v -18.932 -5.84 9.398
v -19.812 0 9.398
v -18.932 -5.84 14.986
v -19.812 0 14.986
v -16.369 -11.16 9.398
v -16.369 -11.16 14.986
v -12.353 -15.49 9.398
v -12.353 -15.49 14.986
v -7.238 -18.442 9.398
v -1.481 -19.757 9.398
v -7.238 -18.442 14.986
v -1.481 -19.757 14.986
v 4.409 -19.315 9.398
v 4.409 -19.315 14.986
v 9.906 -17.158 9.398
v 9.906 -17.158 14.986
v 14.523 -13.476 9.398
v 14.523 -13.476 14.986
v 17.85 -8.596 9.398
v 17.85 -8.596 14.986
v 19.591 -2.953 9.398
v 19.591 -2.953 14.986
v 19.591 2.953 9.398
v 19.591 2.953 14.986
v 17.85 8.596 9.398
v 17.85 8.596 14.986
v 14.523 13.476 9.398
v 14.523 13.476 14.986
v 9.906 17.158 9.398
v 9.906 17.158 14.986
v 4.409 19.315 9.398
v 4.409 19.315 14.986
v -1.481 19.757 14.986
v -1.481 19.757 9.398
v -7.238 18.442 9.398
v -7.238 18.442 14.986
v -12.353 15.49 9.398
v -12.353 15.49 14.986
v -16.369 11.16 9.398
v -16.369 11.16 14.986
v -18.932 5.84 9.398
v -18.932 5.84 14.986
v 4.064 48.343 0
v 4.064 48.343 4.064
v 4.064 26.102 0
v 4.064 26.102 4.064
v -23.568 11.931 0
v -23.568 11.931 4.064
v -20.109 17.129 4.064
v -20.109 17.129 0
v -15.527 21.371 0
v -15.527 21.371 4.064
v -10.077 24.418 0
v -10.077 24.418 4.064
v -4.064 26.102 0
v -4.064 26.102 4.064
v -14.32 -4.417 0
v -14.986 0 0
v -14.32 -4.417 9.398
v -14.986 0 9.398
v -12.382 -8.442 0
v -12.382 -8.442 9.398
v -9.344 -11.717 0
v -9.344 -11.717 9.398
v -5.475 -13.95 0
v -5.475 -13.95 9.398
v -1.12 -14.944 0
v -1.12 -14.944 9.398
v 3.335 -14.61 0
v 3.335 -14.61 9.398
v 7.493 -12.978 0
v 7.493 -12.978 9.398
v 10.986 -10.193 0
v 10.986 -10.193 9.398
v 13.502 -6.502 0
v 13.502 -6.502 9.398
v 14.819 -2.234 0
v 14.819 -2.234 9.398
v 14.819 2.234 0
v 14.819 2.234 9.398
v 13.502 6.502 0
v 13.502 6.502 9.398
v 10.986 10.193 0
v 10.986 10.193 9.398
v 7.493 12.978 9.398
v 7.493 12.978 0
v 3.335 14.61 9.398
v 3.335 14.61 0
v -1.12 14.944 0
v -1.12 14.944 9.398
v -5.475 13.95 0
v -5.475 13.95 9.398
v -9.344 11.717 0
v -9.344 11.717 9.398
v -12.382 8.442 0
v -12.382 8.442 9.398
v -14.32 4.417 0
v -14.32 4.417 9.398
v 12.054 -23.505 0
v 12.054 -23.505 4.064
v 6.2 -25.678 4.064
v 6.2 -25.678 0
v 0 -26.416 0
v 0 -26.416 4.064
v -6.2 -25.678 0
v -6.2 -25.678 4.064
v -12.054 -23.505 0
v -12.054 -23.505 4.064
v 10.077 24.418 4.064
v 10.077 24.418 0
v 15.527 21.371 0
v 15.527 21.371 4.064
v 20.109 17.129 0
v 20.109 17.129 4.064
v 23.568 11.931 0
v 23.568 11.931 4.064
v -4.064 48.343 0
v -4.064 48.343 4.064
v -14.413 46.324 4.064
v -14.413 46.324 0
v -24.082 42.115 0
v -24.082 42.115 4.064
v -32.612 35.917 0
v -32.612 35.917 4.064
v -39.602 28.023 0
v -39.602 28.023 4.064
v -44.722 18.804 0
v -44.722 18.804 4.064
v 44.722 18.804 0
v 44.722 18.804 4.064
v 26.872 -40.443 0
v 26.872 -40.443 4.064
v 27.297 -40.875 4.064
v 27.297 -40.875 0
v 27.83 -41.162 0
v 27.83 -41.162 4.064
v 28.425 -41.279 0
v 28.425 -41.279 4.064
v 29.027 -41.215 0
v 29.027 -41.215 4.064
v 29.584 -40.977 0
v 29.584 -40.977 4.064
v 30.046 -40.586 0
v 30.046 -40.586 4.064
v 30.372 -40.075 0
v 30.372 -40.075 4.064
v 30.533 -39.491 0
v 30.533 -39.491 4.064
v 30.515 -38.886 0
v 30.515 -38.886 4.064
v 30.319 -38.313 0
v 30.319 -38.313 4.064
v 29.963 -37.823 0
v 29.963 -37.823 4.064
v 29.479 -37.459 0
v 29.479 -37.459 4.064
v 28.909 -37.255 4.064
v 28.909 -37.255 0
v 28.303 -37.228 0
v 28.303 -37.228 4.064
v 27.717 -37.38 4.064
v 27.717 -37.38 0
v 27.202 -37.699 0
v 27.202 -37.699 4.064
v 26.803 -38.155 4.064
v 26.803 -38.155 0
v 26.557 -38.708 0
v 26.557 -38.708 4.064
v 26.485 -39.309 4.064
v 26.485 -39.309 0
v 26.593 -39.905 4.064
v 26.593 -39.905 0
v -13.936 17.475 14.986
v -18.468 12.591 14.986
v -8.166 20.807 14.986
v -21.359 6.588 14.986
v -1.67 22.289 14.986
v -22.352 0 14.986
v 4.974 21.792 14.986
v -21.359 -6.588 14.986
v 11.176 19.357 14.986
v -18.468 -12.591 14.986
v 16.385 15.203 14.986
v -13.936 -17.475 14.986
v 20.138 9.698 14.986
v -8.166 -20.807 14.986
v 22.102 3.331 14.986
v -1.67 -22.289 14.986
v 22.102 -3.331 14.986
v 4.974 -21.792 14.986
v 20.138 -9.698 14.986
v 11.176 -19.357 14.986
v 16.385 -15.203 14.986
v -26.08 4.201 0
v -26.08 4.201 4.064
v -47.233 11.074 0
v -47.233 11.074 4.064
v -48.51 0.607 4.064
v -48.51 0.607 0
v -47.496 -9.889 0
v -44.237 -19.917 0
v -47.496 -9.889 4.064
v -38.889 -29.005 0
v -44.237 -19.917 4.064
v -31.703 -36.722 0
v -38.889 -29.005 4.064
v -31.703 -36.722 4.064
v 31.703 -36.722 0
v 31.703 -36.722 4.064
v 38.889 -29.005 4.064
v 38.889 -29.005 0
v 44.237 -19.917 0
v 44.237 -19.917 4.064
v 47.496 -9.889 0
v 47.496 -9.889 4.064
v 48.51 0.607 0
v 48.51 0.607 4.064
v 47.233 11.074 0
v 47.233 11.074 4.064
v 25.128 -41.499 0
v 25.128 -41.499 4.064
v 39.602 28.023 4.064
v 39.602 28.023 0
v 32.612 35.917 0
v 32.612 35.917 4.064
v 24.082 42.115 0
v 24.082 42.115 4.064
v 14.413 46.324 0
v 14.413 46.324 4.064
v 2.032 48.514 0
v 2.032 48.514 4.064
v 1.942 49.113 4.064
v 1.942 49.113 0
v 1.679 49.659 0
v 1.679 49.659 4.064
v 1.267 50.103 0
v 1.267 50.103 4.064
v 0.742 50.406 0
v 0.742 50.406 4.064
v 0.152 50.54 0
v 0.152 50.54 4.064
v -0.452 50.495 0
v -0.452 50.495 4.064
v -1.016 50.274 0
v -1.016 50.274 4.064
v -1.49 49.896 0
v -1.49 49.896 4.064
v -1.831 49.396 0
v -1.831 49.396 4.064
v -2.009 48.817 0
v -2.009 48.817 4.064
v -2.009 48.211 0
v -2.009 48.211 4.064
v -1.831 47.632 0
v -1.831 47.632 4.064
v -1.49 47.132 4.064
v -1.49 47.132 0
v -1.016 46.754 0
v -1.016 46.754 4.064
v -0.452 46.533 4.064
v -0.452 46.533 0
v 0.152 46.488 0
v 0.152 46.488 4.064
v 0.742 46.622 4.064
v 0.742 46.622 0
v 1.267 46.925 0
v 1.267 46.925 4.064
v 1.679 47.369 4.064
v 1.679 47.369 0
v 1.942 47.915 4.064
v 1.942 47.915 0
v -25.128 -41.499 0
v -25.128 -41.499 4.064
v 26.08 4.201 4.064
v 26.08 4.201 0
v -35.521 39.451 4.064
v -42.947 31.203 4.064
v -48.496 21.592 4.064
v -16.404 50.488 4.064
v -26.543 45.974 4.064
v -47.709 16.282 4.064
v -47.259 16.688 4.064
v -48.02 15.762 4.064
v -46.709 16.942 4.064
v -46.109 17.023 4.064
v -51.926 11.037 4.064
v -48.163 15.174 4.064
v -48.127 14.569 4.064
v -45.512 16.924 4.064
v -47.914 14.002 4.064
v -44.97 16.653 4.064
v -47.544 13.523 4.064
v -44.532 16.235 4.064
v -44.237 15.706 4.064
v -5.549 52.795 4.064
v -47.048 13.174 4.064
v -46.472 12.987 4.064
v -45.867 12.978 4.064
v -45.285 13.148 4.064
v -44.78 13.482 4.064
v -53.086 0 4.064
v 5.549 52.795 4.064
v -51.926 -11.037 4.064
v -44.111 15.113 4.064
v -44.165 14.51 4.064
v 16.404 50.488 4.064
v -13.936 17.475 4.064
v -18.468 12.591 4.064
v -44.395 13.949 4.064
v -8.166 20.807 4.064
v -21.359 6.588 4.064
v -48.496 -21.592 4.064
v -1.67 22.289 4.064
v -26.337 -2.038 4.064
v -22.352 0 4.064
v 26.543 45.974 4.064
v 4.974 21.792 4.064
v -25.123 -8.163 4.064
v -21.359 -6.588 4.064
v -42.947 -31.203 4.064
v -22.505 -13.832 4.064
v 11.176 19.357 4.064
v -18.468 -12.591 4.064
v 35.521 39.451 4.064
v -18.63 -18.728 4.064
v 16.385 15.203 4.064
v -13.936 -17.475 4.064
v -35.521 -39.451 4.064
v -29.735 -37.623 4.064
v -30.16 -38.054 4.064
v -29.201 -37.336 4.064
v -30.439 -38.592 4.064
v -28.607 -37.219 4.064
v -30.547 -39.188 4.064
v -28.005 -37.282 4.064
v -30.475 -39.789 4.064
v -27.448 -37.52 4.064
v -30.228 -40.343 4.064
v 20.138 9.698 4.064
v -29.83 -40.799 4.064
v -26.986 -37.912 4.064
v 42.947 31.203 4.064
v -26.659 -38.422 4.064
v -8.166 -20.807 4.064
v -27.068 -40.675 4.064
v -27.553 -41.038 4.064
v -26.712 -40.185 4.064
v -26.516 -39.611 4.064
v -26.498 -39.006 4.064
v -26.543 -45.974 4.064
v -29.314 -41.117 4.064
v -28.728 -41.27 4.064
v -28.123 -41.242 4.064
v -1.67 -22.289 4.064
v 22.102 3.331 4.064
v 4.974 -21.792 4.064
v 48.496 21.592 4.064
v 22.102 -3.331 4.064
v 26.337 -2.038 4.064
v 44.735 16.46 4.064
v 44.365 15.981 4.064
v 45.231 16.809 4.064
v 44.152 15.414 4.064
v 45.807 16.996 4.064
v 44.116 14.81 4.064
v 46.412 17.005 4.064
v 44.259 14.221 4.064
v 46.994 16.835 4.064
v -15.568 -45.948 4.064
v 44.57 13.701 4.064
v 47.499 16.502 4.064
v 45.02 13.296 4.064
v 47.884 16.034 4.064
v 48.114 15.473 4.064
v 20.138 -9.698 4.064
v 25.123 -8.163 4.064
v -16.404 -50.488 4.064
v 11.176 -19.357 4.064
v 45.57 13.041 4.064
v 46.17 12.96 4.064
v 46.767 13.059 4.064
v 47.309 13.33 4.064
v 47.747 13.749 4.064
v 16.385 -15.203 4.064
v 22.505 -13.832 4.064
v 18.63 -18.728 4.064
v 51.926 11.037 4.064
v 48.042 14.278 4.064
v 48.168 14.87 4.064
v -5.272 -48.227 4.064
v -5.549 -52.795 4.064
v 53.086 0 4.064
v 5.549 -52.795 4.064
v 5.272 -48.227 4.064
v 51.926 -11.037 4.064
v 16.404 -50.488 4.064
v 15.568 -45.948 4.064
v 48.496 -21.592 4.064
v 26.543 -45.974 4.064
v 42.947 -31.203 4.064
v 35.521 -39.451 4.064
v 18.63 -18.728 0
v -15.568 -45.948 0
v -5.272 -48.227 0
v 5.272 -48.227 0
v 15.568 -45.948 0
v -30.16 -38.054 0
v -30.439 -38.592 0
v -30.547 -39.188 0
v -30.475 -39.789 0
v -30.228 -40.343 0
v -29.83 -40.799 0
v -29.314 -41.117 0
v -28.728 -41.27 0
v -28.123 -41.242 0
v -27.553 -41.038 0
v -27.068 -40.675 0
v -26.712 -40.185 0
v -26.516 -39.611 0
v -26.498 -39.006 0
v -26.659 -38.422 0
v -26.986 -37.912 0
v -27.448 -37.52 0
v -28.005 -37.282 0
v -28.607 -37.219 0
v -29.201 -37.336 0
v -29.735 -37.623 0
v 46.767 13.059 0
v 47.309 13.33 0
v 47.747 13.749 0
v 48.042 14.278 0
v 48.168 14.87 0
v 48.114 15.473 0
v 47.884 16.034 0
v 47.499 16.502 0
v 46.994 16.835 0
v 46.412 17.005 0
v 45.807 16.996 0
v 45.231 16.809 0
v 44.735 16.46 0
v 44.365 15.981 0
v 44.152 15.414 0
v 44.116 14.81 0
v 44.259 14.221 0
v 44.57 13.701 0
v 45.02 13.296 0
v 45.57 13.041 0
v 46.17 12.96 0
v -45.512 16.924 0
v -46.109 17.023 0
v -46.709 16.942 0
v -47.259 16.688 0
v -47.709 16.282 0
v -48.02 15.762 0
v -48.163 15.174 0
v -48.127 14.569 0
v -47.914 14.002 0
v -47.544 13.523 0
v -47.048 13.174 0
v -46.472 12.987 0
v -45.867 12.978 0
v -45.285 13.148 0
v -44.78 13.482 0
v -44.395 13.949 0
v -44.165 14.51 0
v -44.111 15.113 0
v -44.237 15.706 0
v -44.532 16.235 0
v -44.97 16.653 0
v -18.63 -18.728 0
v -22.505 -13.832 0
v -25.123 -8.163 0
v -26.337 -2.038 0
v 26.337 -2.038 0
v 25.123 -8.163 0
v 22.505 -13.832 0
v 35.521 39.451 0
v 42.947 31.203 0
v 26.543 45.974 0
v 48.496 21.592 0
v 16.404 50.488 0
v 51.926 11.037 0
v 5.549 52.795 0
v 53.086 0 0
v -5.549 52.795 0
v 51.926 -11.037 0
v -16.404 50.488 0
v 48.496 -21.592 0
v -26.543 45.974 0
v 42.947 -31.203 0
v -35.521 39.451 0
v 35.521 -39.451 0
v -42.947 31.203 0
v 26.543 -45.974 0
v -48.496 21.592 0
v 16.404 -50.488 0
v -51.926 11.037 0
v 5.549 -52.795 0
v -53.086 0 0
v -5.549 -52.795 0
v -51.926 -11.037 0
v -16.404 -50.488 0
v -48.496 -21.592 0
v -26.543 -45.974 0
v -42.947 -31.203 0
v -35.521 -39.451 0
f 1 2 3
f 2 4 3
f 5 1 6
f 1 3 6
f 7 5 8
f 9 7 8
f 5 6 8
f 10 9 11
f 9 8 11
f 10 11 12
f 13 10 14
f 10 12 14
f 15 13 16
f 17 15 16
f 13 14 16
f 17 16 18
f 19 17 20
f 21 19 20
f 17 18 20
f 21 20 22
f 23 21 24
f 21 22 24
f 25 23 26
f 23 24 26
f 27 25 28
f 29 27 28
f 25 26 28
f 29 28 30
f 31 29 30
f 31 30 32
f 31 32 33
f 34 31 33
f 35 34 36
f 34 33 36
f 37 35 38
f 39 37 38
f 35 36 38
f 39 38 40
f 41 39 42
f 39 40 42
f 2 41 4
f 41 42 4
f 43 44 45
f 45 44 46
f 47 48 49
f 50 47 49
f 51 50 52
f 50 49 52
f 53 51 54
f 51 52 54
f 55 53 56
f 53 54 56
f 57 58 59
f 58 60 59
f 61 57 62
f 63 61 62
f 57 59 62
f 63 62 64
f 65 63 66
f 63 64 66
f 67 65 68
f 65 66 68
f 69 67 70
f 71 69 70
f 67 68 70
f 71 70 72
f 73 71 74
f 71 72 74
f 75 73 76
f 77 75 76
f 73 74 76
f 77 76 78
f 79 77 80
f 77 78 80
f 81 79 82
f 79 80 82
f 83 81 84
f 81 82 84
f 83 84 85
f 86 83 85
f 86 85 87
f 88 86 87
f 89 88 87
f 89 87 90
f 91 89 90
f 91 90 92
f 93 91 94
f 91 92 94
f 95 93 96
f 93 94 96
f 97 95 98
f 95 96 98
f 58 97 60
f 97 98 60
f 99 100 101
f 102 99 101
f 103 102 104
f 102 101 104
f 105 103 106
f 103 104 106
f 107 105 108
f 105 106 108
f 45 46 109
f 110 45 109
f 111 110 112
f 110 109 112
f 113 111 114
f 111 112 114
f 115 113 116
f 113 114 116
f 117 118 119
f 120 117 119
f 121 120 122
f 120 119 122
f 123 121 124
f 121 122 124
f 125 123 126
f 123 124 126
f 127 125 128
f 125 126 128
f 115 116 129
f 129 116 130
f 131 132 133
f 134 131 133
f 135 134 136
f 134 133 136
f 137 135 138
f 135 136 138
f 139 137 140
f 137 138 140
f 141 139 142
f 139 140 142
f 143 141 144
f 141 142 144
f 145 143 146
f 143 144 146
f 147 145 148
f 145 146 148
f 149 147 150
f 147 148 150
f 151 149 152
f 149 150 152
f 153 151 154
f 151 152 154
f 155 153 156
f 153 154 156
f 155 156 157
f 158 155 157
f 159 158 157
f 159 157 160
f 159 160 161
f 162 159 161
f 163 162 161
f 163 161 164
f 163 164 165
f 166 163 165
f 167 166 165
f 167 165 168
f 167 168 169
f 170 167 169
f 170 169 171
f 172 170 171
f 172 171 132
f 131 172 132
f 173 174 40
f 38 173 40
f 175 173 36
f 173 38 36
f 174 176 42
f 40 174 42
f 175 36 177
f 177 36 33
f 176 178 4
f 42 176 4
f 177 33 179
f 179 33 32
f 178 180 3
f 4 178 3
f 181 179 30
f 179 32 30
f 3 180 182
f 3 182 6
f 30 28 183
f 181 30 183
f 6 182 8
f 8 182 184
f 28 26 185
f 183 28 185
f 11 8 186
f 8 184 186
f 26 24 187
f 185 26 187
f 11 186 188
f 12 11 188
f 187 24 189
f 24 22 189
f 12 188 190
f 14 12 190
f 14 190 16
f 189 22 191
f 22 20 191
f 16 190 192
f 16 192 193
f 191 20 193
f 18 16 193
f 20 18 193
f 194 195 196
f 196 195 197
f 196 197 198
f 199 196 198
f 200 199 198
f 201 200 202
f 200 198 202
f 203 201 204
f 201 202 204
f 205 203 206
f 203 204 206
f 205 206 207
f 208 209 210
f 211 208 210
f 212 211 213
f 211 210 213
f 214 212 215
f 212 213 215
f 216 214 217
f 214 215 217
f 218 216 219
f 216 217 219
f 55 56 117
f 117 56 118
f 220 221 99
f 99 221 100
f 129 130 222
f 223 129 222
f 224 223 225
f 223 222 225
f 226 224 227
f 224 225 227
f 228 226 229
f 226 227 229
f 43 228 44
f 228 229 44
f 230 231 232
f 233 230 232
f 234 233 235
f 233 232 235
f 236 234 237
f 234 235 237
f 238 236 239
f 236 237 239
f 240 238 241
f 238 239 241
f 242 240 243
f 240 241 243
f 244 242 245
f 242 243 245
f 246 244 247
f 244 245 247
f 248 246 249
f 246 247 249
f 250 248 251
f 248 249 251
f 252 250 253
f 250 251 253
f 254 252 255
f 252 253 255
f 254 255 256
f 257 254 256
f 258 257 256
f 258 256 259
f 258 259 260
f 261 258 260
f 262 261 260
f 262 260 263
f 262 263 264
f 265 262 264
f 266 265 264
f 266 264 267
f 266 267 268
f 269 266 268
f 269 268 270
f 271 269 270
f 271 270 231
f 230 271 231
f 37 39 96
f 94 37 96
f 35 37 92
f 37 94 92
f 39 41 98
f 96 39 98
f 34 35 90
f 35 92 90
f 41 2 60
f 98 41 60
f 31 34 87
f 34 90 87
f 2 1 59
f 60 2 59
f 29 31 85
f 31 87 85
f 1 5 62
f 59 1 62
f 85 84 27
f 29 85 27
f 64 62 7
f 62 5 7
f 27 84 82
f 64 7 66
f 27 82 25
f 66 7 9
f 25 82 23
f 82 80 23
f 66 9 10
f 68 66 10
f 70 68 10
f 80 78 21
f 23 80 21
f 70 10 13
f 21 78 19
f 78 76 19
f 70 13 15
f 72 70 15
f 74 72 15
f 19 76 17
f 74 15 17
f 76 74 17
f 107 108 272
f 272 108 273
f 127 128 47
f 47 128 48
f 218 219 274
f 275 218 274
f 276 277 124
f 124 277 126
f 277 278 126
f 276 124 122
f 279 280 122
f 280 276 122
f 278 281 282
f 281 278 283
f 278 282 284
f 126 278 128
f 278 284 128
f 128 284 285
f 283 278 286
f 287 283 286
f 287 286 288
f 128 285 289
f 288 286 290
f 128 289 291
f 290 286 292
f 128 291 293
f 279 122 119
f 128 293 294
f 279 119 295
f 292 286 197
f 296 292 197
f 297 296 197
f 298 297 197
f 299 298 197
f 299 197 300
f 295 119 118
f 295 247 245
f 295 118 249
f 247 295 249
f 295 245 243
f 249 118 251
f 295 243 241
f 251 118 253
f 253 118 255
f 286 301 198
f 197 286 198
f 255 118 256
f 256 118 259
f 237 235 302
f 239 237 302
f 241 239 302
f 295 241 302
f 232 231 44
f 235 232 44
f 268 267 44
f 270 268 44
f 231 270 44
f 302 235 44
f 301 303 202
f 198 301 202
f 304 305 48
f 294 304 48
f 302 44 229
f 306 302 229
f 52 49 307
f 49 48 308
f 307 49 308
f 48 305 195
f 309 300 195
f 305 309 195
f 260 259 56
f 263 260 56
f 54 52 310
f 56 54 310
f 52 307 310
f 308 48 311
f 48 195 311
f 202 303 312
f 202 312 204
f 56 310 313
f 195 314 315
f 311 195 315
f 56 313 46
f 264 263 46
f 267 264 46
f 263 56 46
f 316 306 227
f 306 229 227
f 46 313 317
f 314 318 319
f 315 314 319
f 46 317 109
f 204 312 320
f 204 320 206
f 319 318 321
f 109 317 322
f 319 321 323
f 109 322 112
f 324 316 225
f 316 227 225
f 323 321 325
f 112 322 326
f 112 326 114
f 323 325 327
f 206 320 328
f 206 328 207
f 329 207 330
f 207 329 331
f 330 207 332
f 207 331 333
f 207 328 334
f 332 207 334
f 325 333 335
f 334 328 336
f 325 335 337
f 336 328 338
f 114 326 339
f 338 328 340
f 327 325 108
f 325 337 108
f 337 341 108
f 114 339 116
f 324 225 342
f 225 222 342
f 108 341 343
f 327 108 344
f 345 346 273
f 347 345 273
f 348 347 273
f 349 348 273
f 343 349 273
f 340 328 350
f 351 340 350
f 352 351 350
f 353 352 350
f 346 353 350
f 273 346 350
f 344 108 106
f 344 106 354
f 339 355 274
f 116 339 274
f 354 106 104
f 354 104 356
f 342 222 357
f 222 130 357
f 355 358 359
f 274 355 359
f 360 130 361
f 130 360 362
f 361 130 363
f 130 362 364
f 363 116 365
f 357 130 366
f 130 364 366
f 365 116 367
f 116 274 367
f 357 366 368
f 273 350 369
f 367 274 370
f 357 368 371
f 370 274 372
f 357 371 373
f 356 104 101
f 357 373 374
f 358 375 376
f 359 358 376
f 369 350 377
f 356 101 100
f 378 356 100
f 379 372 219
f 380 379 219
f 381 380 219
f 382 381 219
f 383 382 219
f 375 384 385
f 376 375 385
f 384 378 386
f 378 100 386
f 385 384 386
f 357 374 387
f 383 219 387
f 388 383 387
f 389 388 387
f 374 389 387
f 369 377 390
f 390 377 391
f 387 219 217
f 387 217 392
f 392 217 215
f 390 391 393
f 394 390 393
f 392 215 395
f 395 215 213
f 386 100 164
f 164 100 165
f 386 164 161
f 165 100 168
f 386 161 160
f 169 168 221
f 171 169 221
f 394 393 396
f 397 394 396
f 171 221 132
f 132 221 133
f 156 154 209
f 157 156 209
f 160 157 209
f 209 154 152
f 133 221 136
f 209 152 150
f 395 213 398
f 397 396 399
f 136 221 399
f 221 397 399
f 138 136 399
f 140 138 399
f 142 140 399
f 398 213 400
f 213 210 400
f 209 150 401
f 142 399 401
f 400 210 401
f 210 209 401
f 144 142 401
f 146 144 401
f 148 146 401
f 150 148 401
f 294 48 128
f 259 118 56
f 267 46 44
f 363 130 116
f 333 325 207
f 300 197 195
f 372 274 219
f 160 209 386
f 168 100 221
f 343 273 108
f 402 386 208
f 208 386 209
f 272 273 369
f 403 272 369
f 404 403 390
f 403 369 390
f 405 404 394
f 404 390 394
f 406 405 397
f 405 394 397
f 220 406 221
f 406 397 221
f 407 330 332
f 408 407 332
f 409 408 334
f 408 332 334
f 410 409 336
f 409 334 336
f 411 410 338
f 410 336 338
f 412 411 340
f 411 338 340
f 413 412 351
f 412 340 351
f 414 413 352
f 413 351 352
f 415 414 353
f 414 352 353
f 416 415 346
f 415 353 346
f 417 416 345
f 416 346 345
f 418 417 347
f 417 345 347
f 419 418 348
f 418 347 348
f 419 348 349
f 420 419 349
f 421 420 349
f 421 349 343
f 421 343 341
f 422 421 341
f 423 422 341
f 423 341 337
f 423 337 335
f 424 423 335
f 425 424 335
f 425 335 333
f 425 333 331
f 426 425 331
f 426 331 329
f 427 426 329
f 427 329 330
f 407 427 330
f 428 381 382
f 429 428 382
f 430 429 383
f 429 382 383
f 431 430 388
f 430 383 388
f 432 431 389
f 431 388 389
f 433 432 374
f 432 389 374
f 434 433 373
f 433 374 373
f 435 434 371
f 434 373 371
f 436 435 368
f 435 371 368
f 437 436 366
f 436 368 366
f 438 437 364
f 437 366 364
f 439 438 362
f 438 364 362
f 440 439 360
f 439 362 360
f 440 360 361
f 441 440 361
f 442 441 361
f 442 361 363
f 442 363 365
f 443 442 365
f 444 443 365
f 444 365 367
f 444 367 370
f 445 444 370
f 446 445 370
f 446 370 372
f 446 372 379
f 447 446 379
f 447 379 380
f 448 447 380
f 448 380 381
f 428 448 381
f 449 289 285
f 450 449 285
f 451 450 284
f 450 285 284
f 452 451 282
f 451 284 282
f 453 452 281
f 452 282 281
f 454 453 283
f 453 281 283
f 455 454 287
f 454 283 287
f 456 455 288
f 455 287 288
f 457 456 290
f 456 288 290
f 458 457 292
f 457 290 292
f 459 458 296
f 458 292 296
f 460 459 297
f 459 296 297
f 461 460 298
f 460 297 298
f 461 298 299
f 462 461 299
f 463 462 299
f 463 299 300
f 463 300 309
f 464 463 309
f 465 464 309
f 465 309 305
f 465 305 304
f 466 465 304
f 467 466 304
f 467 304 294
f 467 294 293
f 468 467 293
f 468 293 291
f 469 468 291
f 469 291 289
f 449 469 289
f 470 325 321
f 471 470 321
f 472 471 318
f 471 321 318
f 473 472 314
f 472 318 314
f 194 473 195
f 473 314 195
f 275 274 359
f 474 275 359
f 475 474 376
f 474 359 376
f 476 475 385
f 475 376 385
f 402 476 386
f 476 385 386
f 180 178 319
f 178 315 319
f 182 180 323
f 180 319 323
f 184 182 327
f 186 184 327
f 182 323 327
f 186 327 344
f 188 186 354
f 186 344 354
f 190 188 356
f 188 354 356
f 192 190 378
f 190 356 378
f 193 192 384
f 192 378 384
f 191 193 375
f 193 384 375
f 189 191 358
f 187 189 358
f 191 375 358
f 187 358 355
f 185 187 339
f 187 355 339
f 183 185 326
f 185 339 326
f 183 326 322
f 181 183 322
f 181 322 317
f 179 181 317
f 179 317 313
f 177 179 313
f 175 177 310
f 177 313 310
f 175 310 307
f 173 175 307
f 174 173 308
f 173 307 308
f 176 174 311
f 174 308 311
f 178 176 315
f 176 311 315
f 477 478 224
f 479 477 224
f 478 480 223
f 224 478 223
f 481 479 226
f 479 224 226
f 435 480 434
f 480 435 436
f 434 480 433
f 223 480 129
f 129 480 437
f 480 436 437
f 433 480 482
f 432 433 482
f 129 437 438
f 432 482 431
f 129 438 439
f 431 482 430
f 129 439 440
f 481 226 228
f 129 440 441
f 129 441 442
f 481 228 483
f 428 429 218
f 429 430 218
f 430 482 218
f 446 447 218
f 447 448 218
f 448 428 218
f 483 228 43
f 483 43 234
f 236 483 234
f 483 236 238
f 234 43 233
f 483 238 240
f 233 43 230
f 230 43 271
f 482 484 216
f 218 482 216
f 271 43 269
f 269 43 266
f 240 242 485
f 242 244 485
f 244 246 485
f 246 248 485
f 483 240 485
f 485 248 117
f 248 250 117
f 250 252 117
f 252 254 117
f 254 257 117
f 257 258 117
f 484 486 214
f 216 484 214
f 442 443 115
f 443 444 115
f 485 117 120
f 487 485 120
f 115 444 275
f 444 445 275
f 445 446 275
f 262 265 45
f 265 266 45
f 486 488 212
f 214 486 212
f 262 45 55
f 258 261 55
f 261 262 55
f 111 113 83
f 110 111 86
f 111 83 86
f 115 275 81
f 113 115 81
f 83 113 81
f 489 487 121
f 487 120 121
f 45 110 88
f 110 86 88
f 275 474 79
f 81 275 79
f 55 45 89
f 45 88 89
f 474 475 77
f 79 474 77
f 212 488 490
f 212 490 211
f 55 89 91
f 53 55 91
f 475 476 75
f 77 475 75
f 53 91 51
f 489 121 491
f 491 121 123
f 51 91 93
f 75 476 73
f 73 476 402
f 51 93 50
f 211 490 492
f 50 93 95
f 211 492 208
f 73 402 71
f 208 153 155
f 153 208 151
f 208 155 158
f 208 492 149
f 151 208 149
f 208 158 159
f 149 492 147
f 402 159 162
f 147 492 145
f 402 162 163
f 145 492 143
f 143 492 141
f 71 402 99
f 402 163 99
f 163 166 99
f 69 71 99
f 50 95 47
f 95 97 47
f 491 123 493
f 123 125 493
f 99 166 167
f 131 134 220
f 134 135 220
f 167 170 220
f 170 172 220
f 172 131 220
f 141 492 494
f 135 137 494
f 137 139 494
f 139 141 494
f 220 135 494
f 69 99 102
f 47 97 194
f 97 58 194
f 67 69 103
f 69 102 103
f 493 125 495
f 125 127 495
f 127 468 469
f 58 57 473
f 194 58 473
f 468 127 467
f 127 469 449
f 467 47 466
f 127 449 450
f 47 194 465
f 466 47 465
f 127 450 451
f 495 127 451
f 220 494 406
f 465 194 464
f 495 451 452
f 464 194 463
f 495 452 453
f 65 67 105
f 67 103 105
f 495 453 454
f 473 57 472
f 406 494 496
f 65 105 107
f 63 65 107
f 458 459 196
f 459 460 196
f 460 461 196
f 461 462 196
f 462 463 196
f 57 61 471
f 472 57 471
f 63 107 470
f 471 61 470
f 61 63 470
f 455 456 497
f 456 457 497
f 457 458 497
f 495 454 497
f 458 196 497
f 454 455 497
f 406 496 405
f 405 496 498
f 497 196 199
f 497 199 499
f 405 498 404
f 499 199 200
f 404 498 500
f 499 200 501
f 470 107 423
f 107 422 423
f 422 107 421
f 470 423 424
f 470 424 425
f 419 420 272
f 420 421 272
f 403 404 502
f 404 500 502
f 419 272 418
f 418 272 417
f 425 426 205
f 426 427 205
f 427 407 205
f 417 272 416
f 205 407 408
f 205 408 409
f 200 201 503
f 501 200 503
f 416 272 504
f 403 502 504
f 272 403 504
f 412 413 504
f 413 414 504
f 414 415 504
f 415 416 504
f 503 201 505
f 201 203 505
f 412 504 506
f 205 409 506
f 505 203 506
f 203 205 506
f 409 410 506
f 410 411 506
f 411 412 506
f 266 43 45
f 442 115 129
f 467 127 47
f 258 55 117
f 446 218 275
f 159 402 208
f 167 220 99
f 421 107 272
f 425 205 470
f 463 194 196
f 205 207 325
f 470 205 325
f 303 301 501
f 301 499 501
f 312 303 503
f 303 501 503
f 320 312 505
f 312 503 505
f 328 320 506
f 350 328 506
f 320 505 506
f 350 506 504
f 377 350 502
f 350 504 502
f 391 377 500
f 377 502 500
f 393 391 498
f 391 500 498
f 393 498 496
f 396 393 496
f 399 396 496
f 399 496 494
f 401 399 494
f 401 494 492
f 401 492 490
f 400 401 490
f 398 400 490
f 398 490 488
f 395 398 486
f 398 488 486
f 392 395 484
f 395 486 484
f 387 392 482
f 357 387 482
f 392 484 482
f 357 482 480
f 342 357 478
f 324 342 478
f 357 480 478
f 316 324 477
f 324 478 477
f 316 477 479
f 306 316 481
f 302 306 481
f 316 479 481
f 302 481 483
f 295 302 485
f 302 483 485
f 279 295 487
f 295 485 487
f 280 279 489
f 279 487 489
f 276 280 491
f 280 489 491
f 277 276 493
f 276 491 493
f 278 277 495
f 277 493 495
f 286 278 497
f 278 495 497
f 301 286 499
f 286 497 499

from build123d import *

# Parameters (mm, degrees)
SKETCH2_R          = 2.032
CUT_EXTRUDE1_DEPTH = 76.865254735
CIRPATTERN1_COUNT  = 5


with BuildPart() as part:
    # Sketch1 → Revolve1 (revolve)
    with BuildSketch(Plane(origin=(0, 0, 0), x_dir=(0, 0, -1), z_dir=(1, 0, 0)), mode=Mode.PRIVATE) as revolve1_sk:
        Polygon((0, 14.986), (-9.398, 14.986), (-9.398, 19.812), (-14.986, 19.812), (-14.986, 22.352), (-4.064, 22.352), (-4.064, 53.086), (0, 53.086), align=None)
    revolve(revolve1_sk.sketch.rotate(Axis((0, 0, 0), (0, 0, 1)), 90), axis=Axis((0, 0, 0), (0, 0, 1)))

    # Sketch2 → Cut-Extrude1 (cut, through all)
    with BuildSketch(Plane.XY.offset(4.064)):
        with Locations((0, 48.514)):
            Circle(SKETCH2_R)
        with BuildLine():
            Line((4.064, 48.343480429), (4.064, 26.1015126))
            ThreePointArc((4.064, 26.1015126), (15.526935225, 21.370992923), (23.568168578, 11.930904654))
            Line((23.568168578, 11.930904654), (44.721537017, 18.804050702))
            ThreePointArc((44.721537017, 18.804050702), (28.51581373, 39.248650465), (4.064, 48.343480429))
        make_face()
    cut_extrude1 = extrude(amount=-CUT_EXTRUDE1_DEPTH, mode=Mode.SUBTRACT)

    # CirPattern1: Cut-Extrude1 ×5 about axis
    cirpattern1_axis = Axis((0, 0, 0), (0, 0, 1))
    for i in range(1, CIRPATTERN1_COUNT):
        add(cut_extrude1.rotate(cirpattern1_axis, i * 360 / CIRPATTERN1_COUNT), mode=Mode.SUBTRACT)


solid = part.part
